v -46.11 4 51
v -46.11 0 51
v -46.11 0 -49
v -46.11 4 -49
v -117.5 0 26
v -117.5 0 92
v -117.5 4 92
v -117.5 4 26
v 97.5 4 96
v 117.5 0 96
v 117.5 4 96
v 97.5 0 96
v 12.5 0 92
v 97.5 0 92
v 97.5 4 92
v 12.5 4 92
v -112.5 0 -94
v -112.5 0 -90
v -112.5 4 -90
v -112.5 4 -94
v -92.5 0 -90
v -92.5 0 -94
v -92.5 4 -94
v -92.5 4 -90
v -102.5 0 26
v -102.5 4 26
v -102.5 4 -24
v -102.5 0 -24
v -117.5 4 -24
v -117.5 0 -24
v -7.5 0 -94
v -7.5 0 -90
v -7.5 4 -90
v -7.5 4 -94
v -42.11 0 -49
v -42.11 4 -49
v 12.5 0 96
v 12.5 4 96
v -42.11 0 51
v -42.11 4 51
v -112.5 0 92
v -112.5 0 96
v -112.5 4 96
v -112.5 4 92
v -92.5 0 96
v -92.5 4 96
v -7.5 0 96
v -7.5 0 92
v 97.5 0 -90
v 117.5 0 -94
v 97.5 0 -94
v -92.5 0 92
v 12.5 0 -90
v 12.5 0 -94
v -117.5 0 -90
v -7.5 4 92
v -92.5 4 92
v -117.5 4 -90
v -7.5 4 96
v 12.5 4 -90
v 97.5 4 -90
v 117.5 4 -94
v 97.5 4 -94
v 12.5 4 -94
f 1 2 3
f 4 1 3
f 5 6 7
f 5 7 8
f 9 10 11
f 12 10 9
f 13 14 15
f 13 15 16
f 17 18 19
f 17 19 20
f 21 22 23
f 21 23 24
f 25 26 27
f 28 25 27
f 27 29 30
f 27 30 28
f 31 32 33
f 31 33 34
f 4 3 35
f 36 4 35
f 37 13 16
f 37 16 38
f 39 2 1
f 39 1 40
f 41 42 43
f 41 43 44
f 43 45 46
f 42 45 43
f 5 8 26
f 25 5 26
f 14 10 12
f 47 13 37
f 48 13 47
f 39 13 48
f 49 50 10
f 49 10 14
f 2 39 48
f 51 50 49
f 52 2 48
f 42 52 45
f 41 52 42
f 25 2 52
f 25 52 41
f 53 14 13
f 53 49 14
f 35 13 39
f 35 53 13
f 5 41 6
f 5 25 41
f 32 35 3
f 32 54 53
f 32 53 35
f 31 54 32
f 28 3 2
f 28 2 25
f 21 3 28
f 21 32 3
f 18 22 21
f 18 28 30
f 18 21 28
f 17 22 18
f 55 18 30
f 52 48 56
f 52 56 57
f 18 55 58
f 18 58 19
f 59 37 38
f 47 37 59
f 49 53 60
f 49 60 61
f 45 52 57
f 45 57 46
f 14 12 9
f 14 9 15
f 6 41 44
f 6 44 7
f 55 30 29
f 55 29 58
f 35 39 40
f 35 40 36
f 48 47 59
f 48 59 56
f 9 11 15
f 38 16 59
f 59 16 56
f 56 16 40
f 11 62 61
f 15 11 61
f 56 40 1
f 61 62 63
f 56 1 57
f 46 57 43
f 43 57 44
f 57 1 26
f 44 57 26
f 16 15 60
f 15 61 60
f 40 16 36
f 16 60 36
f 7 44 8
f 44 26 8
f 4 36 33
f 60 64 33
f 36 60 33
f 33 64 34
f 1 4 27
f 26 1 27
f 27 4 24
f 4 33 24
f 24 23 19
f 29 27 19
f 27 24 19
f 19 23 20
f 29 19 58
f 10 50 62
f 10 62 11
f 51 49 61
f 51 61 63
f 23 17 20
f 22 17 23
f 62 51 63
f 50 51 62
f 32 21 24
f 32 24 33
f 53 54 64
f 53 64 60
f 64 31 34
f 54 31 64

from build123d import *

# Parameters (mm, degrees)
SKETCH1_W           = 4
SKETCH1_H           = 100
BOSS_EXTRUDE1_DEPTH = 4
SKETCH2_W           = 30
SKETCH2_H           = 50
CUT_EXTRUDE1_DEPTH  = 10


with BuildPart() as part:
    # Sketch1 → Boss-Extrude1 (new body)
    with BuildSketch(Plane(origin=(0, 0, 0), x_dir=(1, 0, 0), z_dir=(0, 1, 0))):
        Polygon((-112.5, 94), (-92.5, 94), (-92.5, 90), (-7.5, 90), (-7.5, 94), (12.5, 94), (12.5, 90), (97.5, 90), (97.5, 94), (117.5, 94), (117.5, -96), (97.5, -96), (97.5, -92), (12.5, -92), (12.5, -96), (-7.5, -96), (-7.5, -92), (-92.5, -92), (-92.5, -96), (-112.5, -96), (-112.5, -92), (-117.5, -92), (-117.5, 90), (-112.5, 90), align=None)
        with Locations((-44.11, -1)):
            Rectangle(SKETCH1_W, SKETCH1_H, mode=Mode.SUBTRACT)
    extrude(amount=BOSS_EXTRUDE1_DEPTH)

    # Sketch2 → Cut-Extrude1 (cut)
    with BuildSketch(Plane(origin=(0, 4, 0), x_dir=(1, 0, 0), z_dir=(0, 1, 0))):
        with Locations((-117.5, -1)):
            Rectangle(SKETCH2_W, SKETCH2_H)
    extrude(amount=-CUT_EXTRUDE1_DEPTH, mode=Mode.SUBTRACT)


solid = part.part
